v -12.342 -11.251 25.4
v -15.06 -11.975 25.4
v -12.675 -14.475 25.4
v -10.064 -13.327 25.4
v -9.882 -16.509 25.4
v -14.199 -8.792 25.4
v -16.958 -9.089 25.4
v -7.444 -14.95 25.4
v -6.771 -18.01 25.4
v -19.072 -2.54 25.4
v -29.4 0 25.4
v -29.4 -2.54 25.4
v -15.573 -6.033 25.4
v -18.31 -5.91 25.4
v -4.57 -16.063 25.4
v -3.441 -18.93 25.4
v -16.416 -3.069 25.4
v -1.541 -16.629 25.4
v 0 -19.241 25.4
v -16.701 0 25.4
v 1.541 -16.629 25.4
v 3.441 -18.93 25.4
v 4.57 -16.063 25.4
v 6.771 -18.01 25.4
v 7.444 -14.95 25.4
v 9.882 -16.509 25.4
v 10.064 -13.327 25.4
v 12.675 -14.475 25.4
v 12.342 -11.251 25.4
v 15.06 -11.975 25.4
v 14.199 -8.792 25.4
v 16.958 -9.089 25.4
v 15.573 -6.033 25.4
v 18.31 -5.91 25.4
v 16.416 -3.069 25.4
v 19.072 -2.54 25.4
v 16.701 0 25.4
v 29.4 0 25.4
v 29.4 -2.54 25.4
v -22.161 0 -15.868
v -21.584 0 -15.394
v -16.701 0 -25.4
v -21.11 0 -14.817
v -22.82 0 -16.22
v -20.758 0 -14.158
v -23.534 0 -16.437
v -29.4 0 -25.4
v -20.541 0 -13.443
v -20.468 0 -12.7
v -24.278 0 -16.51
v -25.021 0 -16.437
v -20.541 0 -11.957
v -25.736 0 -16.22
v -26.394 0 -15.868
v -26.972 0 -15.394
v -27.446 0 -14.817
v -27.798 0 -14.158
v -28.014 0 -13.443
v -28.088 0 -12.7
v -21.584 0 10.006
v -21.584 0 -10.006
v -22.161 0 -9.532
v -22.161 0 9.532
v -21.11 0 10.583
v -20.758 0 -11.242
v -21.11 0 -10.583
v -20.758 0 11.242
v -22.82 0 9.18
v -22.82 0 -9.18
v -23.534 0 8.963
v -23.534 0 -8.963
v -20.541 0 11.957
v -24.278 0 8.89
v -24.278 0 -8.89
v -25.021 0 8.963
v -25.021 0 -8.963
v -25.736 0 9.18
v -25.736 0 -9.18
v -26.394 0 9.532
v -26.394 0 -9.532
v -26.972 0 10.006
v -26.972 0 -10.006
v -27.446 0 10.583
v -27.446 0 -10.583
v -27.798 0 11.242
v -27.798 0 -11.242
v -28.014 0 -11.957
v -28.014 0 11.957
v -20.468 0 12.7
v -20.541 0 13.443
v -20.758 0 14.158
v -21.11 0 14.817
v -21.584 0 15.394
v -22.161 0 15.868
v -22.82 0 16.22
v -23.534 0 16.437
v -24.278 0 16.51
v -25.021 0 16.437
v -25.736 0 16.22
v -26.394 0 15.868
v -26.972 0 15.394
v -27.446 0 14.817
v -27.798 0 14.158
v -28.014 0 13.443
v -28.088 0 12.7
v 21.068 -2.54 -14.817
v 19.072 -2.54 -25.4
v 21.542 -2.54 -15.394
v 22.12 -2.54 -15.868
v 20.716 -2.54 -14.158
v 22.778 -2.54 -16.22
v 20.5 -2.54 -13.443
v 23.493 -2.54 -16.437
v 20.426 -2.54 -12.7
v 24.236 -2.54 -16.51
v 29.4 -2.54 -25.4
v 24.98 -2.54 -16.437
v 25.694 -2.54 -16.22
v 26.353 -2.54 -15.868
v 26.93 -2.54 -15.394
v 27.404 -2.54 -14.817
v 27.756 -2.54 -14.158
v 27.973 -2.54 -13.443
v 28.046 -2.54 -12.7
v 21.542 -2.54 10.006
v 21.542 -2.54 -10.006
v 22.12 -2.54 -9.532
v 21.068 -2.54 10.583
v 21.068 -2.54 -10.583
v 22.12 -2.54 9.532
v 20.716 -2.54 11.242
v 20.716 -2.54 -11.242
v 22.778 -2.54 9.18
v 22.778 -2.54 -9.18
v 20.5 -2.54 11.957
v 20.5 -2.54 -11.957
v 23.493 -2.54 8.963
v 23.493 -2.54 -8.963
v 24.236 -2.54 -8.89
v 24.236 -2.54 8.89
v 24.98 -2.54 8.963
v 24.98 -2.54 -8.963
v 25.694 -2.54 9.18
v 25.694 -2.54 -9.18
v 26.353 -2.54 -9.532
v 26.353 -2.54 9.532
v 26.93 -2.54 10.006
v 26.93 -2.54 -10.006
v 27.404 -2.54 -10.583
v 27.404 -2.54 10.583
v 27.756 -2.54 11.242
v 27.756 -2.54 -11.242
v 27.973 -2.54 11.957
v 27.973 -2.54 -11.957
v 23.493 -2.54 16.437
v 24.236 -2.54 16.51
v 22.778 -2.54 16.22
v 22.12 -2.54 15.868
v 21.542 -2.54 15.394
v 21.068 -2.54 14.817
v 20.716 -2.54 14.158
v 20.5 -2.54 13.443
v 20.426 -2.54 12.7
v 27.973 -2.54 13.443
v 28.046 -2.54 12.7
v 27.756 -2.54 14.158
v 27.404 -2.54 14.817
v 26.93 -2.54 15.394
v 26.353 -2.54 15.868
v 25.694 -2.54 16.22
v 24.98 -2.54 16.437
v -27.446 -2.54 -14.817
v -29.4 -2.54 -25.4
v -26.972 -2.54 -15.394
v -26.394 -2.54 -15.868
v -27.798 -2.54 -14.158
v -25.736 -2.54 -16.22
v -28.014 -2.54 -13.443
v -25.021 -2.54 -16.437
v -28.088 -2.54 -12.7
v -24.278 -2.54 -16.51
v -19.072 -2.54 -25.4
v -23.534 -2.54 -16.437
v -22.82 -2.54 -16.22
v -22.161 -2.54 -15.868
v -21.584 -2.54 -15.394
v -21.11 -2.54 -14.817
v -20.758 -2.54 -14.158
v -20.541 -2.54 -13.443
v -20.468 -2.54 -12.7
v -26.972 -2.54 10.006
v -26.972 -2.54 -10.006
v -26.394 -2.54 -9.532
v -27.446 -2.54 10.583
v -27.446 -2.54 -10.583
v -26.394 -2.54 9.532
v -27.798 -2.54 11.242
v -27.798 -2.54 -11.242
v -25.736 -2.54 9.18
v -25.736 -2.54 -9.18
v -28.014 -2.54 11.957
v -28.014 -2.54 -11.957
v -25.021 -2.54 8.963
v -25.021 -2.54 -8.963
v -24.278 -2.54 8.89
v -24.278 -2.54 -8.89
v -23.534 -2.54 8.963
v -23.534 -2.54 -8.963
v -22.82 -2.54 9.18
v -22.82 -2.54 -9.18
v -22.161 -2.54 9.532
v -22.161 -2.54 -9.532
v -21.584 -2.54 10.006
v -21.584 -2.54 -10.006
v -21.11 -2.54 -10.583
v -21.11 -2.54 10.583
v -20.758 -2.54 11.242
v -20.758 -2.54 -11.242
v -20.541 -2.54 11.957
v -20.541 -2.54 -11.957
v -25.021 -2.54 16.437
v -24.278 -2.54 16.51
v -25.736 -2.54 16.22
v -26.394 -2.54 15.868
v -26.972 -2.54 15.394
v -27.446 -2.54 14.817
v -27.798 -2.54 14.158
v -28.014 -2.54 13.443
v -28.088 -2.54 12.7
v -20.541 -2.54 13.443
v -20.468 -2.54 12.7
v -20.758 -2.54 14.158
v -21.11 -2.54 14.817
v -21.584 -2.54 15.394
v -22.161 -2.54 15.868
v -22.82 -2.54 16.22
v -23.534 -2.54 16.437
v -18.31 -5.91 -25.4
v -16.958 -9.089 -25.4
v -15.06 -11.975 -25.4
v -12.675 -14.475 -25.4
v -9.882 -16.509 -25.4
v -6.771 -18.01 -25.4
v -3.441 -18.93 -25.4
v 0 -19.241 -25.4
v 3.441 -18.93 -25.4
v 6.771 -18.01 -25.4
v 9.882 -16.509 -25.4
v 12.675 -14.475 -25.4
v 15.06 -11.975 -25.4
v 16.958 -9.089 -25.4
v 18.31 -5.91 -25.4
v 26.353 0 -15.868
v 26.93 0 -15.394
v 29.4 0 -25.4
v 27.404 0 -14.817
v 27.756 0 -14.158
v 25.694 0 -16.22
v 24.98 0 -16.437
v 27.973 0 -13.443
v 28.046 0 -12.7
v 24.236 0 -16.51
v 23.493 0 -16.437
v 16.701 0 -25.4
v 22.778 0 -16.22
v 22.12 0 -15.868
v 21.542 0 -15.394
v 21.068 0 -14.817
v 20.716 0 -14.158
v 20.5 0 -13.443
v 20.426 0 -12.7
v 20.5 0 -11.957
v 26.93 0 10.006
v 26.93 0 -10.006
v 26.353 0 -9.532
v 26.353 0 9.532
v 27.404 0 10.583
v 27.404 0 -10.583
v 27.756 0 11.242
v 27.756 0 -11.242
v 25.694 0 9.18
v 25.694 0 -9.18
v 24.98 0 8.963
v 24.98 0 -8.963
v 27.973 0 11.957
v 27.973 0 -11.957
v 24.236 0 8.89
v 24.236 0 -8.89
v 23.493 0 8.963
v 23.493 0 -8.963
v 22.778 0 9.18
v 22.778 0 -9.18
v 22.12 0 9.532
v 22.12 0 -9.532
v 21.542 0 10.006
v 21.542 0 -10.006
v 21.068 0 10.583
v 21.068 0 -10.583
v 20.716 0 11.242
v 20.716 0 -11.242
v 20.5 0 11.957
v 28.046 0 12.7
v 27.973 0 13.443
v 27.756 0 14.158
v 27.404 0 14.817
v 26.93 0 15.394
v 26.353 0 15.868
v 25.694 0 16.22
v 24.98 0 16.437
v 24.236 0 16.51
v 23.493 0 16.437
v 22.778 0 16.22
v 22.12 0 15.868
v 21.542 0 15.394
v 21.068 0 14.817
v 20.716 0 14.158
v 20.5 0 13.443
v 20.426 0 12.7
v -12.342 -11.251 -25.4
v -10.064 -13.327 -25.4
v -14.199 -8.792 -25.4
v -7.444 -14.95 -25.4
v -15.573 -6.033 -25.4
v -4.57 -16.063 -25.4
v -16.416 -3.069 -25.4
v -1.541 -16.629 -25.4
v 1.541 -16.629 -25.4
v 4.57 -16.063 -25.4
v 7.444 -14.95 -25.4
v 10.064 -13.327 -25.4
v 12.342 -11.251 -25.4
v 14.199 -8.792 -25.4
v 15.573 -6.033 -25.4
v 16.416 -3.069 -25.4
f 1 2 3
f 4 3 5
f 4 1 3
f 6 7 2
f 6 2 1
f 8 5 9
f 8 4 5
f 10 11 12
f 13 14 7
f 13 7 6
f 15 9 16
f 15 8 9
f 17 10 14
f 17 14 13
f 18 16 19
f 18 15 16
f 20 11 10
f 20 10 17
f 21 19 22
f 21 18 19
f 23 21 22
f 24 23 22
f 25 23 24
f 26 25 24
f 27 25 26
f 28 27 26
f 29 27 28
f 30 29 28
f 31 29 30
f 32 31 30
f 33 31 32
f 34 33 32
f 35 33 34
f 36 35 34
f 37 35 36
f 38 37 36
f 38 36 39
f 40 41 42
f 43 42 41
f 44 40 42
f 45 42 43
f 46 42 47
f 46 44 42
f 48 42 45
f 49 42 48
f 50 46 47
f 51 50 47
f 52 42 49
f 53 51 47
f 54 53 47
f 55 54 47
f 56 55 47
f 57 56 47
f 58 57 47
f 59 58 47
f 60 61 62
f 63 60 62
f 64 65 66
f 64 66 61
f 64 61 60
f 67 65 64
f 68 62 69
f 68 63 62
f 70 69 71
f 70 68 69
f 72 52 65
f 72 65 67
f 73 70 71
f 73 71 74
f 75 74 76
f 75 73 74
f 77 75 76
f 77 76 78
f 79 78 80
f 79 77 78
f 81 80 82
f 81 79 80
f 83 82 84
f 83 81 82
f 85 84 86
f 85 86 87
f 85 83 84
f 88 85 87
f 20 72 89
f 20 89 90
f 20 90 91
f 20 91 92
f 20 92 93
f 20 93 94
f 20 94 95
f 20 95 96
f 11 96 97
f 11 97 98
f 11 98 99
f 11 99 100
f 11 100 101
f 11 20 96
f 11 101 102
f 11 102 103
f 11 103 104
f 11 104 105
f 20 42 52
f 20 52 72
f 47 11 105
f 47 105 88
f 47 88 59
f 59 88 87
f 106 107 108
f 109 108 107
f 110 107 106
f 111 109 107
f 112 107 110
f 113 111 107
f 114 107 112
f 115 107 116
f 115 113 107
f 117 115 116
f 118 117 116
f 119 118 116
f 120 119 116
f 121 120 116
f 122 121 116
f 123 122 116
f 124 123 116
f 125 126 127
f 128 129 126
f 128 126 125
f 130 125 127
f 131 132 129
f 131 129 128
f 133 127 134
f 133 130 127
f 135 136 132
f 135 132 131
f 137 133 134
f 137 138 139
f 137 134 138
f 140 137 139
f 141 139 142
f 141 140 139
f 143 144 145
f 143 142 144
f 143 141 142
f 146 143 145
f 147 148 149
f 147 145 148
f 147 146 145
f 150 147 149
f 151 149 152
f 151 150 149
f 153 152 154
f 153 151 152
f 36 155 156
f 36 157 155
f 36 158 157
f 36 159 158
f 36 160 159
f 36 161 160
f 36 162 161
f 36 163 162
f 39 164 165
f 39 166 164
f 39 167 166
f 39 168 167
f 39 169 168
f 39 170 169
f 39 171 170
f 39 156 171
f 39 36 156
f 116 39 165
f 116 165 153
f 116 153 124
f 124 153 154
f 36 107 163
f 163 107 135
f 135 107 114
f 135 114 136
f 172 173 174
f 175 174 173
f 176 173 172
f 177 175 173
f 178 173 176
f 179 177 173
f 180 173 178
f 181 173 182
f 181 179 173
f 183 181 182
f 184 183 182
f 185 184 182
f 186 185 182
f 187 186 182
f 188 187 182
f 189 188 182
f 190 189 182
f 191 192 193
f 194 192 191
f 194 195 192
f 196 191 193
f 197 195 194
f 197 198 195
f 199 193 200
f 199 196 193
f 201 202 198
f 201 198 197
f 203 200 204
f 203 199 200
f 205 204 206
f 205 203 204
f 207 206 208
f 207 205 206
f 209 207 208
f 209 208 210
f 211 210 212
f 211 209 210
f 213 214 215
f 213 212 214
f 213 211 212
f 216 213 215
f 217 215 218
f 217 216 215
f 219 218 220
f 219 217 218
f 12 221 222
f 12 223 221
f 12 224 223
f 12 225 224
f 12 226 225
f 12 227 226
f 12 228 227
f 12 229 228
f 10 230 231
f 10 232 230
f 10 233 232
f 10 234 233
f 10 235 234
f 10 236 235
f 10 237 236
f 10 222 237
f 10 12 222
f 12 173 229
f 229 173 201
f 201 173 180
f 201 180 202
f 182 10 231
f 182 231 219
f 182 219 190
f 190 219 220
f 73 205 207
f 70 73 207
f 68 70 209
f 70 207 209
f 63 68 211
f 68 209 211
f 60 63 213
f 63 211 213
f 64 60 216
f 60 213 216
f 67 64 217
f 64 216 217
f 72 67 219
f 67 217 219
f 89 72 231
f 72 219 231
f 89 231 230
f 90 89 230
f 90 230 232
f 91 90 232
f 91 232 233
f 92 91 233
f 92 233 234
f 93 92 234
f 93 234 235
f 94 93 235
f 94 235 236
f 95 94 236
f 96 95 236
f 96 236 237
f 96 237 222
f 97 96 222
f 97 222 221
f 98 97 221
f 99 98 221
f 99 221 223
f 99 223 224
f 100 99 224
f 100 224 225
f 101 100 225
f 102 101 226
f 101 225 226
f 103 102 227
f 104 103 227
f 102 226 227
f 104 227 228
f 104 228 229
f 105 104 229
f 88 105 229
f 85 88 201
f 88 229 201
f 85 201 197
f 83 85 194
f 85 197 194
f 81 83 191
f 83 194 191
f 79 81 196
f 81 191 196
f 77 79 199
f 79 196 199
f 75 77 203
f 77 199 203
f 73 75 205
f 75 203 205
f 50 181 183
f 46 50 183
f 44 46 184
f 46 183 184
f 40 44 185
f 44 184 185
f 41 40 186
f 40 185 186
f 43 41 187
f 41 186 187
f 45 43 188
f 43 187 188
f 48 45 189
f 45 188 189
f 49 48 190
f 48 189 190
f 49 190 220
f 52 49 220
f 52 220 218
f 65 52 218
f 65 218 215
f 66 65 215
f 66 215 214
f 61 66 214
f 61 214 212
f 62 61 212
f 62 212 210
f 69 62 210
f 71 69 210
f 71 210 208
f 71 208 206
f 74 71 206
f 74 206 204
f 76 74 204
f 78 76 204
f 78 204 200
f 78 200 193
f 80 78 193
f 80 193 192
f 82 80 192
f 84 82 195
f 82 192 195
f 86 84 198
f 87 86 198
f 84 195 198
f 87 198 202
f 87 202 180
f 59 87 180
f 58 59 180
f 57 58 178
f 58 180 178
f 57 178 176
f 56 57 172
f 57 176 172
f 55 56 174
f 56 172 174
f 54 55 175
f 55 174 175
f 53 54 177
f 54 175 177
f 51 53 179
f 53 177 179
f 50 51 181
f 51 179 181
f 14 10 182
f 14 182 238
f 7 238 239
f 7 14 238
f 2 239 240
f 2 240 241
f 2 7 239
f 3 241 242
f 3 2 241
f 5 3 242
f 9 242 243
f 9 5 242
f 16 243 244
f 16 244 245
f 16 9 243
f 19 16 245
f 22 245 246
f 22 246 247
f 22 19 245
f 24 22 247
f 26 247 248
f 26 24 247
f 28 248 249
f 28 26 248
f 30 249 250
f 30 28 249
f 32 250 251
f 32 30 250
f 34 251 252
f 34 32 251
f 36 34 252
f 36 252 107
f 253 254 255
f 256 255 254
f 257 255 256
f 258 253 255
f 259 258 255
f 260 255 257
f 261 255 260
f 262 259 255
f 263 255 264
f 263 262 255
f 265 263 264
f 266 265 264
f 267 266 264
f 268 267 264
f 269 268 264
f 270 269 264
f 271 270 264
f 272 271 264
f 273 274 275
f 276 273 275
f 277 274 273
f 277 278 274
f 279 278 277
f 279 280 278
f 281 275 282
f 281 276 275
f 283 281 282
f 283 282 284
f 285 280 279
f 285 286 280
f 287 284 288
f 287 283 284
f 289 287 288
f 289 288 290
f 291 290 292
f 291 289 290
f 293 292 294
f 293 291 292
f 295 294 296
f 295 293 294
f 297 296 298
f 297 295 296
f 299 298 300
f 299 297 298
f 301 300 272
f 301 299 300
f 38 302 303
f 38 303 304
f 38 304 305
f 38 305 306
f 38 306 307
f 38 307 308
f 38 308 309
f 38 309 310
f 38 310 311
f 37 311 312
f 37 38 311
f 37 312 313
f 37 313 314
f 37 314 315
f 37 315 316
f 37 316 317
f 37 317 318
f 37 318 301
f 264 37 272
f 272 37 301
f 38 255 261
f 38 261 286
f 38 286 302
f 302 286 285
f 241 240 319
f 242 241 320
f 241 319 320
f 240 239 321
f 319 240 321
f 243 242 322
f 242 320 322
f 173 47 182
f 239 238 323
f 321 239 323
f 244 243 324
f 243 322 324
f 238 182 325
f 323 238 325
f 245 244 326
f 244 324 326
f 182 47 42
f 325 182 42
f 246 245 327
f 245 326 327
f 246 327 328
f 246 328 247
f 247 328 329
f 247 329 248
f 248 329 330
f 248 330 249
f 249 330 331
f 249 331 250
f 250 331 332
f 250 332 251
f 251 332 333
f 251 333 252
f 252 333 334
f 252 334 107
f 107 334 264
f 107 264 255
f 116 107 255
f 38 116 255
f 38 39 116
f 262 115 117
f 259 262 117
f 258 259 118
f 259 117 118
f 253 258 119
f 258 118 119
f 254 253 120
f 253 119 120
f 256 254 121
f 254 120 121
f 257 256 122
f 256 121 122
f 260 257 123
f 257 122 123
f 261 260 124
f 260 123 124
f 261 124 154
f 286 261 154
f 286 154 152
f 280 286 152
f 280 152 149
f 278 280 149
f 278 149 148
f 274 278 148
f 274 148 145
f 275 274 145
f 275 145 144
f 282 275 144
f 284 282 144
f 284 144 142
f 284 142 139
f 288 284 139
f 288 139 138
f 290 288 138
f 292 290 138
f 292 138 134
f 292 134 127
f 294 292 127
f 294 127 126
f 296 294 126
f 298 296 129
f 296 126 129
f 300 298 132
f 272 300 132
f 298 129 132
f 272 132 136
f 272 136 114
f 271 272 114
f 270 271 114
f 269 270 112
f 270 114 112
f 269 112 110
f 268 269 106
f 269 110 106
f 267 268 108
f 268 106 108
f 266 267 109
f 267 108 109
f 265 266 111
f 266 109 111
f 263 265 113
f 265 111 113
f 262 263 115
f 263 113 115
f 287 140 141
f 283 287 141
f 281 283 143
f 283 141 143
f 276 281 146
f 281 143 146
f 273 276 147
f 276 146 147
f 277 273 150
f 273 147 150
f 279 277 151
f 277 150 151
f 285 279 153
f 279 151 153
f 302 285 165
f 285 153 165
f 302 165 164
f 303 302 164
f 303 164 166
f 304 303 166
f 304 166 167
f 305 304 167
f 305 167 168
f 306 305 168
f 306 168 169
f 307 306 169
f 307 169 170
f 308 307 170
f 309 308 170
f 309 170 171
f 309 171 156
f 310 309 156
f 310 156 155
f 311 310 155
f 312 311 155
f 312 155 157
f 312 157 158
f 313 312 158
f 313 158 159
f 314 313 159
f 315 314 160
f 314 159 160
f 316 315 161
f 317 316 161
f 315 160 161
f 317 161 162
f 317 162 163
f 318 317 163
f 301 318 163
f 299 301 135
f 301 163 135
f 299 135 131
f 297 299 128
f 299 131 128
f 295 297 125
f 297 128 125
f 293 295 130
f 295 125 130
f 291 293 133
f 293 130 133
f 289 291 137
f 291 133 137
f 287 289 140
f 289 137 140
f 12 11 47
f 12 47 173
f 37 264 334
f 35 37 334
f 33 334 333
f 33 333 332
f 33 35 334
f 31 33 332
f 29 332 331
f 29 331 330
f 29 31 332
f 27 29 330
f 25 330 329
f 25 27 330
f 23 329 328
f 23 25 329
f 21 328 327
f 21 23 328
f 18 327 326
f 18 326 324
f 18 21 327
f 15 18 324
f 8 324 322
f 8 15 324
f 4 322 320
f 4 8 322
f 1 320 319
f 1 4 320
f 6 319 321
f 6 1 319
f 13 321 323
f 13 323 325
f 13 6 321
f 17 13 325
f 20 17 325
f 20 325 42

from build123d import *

# Parameters (mm, degrees)
EXTRUDE_THIN1_DEPTH = 25.4
SKETCH2_R           = 3.81
CUT_EXTRUDE1_DEPTH  = 8.128


with BuildPart() as part:
    # Sketch1 → Extrude-Thin1 (new, symmetric)
    with BuildSketch(Plane.XY):
        with BuildLine():
            Line((29.4005, 0), (16.7005, 0))
            ThreePointArc((16.7005, 0), (0, -16.7005), (-16.7005, 0))
            Line((-16.7005, 0), (-29.4005, 0))
            Line((-29.4005, 0), (-29.4005, -2.54))
            Line((-29.4005, -2.54), (-19.07210634, -2.54))
            ThreePointArc((-19.07210634, -2.54), (0, -19.2405), (19.07210634, -2.54))
            Line((19.07210634, -2.54), (29.4005, -2.54))
            Line((29.4005, -2.54), (29.4005, 0))
        make_face()
    extrude(amount=EXTRUDE_THIN1_DEPTH, both=True)

    # Sketch2 → Cut-Extrude1 (cut)
    with BuildSketch(Plane.XZ.offset(2.54)):
        with Locations(Location((24.23630317, -12.7, 0), (0, 0, 270))):
            Circle(SKETCH2_R)
        with Locations(Location((24.23630317, 12.7, 0), (0, 0, 270))):
            Circle(SKETCH2_R)
        with Locations(Location((-24.27769683, 12.7, 0), (0, 0, 270))):
            Circle(SKETCH2_R)
        with Locations(Location((-24.27769683, -12.7, 0), (0, 0, 270))):
            Circle(SKETCH2_R)
    extrude(amount=-CUT_EXTRUDE1_DEPTH, mode=Mode.SUBTRACT)


solid = part.part
